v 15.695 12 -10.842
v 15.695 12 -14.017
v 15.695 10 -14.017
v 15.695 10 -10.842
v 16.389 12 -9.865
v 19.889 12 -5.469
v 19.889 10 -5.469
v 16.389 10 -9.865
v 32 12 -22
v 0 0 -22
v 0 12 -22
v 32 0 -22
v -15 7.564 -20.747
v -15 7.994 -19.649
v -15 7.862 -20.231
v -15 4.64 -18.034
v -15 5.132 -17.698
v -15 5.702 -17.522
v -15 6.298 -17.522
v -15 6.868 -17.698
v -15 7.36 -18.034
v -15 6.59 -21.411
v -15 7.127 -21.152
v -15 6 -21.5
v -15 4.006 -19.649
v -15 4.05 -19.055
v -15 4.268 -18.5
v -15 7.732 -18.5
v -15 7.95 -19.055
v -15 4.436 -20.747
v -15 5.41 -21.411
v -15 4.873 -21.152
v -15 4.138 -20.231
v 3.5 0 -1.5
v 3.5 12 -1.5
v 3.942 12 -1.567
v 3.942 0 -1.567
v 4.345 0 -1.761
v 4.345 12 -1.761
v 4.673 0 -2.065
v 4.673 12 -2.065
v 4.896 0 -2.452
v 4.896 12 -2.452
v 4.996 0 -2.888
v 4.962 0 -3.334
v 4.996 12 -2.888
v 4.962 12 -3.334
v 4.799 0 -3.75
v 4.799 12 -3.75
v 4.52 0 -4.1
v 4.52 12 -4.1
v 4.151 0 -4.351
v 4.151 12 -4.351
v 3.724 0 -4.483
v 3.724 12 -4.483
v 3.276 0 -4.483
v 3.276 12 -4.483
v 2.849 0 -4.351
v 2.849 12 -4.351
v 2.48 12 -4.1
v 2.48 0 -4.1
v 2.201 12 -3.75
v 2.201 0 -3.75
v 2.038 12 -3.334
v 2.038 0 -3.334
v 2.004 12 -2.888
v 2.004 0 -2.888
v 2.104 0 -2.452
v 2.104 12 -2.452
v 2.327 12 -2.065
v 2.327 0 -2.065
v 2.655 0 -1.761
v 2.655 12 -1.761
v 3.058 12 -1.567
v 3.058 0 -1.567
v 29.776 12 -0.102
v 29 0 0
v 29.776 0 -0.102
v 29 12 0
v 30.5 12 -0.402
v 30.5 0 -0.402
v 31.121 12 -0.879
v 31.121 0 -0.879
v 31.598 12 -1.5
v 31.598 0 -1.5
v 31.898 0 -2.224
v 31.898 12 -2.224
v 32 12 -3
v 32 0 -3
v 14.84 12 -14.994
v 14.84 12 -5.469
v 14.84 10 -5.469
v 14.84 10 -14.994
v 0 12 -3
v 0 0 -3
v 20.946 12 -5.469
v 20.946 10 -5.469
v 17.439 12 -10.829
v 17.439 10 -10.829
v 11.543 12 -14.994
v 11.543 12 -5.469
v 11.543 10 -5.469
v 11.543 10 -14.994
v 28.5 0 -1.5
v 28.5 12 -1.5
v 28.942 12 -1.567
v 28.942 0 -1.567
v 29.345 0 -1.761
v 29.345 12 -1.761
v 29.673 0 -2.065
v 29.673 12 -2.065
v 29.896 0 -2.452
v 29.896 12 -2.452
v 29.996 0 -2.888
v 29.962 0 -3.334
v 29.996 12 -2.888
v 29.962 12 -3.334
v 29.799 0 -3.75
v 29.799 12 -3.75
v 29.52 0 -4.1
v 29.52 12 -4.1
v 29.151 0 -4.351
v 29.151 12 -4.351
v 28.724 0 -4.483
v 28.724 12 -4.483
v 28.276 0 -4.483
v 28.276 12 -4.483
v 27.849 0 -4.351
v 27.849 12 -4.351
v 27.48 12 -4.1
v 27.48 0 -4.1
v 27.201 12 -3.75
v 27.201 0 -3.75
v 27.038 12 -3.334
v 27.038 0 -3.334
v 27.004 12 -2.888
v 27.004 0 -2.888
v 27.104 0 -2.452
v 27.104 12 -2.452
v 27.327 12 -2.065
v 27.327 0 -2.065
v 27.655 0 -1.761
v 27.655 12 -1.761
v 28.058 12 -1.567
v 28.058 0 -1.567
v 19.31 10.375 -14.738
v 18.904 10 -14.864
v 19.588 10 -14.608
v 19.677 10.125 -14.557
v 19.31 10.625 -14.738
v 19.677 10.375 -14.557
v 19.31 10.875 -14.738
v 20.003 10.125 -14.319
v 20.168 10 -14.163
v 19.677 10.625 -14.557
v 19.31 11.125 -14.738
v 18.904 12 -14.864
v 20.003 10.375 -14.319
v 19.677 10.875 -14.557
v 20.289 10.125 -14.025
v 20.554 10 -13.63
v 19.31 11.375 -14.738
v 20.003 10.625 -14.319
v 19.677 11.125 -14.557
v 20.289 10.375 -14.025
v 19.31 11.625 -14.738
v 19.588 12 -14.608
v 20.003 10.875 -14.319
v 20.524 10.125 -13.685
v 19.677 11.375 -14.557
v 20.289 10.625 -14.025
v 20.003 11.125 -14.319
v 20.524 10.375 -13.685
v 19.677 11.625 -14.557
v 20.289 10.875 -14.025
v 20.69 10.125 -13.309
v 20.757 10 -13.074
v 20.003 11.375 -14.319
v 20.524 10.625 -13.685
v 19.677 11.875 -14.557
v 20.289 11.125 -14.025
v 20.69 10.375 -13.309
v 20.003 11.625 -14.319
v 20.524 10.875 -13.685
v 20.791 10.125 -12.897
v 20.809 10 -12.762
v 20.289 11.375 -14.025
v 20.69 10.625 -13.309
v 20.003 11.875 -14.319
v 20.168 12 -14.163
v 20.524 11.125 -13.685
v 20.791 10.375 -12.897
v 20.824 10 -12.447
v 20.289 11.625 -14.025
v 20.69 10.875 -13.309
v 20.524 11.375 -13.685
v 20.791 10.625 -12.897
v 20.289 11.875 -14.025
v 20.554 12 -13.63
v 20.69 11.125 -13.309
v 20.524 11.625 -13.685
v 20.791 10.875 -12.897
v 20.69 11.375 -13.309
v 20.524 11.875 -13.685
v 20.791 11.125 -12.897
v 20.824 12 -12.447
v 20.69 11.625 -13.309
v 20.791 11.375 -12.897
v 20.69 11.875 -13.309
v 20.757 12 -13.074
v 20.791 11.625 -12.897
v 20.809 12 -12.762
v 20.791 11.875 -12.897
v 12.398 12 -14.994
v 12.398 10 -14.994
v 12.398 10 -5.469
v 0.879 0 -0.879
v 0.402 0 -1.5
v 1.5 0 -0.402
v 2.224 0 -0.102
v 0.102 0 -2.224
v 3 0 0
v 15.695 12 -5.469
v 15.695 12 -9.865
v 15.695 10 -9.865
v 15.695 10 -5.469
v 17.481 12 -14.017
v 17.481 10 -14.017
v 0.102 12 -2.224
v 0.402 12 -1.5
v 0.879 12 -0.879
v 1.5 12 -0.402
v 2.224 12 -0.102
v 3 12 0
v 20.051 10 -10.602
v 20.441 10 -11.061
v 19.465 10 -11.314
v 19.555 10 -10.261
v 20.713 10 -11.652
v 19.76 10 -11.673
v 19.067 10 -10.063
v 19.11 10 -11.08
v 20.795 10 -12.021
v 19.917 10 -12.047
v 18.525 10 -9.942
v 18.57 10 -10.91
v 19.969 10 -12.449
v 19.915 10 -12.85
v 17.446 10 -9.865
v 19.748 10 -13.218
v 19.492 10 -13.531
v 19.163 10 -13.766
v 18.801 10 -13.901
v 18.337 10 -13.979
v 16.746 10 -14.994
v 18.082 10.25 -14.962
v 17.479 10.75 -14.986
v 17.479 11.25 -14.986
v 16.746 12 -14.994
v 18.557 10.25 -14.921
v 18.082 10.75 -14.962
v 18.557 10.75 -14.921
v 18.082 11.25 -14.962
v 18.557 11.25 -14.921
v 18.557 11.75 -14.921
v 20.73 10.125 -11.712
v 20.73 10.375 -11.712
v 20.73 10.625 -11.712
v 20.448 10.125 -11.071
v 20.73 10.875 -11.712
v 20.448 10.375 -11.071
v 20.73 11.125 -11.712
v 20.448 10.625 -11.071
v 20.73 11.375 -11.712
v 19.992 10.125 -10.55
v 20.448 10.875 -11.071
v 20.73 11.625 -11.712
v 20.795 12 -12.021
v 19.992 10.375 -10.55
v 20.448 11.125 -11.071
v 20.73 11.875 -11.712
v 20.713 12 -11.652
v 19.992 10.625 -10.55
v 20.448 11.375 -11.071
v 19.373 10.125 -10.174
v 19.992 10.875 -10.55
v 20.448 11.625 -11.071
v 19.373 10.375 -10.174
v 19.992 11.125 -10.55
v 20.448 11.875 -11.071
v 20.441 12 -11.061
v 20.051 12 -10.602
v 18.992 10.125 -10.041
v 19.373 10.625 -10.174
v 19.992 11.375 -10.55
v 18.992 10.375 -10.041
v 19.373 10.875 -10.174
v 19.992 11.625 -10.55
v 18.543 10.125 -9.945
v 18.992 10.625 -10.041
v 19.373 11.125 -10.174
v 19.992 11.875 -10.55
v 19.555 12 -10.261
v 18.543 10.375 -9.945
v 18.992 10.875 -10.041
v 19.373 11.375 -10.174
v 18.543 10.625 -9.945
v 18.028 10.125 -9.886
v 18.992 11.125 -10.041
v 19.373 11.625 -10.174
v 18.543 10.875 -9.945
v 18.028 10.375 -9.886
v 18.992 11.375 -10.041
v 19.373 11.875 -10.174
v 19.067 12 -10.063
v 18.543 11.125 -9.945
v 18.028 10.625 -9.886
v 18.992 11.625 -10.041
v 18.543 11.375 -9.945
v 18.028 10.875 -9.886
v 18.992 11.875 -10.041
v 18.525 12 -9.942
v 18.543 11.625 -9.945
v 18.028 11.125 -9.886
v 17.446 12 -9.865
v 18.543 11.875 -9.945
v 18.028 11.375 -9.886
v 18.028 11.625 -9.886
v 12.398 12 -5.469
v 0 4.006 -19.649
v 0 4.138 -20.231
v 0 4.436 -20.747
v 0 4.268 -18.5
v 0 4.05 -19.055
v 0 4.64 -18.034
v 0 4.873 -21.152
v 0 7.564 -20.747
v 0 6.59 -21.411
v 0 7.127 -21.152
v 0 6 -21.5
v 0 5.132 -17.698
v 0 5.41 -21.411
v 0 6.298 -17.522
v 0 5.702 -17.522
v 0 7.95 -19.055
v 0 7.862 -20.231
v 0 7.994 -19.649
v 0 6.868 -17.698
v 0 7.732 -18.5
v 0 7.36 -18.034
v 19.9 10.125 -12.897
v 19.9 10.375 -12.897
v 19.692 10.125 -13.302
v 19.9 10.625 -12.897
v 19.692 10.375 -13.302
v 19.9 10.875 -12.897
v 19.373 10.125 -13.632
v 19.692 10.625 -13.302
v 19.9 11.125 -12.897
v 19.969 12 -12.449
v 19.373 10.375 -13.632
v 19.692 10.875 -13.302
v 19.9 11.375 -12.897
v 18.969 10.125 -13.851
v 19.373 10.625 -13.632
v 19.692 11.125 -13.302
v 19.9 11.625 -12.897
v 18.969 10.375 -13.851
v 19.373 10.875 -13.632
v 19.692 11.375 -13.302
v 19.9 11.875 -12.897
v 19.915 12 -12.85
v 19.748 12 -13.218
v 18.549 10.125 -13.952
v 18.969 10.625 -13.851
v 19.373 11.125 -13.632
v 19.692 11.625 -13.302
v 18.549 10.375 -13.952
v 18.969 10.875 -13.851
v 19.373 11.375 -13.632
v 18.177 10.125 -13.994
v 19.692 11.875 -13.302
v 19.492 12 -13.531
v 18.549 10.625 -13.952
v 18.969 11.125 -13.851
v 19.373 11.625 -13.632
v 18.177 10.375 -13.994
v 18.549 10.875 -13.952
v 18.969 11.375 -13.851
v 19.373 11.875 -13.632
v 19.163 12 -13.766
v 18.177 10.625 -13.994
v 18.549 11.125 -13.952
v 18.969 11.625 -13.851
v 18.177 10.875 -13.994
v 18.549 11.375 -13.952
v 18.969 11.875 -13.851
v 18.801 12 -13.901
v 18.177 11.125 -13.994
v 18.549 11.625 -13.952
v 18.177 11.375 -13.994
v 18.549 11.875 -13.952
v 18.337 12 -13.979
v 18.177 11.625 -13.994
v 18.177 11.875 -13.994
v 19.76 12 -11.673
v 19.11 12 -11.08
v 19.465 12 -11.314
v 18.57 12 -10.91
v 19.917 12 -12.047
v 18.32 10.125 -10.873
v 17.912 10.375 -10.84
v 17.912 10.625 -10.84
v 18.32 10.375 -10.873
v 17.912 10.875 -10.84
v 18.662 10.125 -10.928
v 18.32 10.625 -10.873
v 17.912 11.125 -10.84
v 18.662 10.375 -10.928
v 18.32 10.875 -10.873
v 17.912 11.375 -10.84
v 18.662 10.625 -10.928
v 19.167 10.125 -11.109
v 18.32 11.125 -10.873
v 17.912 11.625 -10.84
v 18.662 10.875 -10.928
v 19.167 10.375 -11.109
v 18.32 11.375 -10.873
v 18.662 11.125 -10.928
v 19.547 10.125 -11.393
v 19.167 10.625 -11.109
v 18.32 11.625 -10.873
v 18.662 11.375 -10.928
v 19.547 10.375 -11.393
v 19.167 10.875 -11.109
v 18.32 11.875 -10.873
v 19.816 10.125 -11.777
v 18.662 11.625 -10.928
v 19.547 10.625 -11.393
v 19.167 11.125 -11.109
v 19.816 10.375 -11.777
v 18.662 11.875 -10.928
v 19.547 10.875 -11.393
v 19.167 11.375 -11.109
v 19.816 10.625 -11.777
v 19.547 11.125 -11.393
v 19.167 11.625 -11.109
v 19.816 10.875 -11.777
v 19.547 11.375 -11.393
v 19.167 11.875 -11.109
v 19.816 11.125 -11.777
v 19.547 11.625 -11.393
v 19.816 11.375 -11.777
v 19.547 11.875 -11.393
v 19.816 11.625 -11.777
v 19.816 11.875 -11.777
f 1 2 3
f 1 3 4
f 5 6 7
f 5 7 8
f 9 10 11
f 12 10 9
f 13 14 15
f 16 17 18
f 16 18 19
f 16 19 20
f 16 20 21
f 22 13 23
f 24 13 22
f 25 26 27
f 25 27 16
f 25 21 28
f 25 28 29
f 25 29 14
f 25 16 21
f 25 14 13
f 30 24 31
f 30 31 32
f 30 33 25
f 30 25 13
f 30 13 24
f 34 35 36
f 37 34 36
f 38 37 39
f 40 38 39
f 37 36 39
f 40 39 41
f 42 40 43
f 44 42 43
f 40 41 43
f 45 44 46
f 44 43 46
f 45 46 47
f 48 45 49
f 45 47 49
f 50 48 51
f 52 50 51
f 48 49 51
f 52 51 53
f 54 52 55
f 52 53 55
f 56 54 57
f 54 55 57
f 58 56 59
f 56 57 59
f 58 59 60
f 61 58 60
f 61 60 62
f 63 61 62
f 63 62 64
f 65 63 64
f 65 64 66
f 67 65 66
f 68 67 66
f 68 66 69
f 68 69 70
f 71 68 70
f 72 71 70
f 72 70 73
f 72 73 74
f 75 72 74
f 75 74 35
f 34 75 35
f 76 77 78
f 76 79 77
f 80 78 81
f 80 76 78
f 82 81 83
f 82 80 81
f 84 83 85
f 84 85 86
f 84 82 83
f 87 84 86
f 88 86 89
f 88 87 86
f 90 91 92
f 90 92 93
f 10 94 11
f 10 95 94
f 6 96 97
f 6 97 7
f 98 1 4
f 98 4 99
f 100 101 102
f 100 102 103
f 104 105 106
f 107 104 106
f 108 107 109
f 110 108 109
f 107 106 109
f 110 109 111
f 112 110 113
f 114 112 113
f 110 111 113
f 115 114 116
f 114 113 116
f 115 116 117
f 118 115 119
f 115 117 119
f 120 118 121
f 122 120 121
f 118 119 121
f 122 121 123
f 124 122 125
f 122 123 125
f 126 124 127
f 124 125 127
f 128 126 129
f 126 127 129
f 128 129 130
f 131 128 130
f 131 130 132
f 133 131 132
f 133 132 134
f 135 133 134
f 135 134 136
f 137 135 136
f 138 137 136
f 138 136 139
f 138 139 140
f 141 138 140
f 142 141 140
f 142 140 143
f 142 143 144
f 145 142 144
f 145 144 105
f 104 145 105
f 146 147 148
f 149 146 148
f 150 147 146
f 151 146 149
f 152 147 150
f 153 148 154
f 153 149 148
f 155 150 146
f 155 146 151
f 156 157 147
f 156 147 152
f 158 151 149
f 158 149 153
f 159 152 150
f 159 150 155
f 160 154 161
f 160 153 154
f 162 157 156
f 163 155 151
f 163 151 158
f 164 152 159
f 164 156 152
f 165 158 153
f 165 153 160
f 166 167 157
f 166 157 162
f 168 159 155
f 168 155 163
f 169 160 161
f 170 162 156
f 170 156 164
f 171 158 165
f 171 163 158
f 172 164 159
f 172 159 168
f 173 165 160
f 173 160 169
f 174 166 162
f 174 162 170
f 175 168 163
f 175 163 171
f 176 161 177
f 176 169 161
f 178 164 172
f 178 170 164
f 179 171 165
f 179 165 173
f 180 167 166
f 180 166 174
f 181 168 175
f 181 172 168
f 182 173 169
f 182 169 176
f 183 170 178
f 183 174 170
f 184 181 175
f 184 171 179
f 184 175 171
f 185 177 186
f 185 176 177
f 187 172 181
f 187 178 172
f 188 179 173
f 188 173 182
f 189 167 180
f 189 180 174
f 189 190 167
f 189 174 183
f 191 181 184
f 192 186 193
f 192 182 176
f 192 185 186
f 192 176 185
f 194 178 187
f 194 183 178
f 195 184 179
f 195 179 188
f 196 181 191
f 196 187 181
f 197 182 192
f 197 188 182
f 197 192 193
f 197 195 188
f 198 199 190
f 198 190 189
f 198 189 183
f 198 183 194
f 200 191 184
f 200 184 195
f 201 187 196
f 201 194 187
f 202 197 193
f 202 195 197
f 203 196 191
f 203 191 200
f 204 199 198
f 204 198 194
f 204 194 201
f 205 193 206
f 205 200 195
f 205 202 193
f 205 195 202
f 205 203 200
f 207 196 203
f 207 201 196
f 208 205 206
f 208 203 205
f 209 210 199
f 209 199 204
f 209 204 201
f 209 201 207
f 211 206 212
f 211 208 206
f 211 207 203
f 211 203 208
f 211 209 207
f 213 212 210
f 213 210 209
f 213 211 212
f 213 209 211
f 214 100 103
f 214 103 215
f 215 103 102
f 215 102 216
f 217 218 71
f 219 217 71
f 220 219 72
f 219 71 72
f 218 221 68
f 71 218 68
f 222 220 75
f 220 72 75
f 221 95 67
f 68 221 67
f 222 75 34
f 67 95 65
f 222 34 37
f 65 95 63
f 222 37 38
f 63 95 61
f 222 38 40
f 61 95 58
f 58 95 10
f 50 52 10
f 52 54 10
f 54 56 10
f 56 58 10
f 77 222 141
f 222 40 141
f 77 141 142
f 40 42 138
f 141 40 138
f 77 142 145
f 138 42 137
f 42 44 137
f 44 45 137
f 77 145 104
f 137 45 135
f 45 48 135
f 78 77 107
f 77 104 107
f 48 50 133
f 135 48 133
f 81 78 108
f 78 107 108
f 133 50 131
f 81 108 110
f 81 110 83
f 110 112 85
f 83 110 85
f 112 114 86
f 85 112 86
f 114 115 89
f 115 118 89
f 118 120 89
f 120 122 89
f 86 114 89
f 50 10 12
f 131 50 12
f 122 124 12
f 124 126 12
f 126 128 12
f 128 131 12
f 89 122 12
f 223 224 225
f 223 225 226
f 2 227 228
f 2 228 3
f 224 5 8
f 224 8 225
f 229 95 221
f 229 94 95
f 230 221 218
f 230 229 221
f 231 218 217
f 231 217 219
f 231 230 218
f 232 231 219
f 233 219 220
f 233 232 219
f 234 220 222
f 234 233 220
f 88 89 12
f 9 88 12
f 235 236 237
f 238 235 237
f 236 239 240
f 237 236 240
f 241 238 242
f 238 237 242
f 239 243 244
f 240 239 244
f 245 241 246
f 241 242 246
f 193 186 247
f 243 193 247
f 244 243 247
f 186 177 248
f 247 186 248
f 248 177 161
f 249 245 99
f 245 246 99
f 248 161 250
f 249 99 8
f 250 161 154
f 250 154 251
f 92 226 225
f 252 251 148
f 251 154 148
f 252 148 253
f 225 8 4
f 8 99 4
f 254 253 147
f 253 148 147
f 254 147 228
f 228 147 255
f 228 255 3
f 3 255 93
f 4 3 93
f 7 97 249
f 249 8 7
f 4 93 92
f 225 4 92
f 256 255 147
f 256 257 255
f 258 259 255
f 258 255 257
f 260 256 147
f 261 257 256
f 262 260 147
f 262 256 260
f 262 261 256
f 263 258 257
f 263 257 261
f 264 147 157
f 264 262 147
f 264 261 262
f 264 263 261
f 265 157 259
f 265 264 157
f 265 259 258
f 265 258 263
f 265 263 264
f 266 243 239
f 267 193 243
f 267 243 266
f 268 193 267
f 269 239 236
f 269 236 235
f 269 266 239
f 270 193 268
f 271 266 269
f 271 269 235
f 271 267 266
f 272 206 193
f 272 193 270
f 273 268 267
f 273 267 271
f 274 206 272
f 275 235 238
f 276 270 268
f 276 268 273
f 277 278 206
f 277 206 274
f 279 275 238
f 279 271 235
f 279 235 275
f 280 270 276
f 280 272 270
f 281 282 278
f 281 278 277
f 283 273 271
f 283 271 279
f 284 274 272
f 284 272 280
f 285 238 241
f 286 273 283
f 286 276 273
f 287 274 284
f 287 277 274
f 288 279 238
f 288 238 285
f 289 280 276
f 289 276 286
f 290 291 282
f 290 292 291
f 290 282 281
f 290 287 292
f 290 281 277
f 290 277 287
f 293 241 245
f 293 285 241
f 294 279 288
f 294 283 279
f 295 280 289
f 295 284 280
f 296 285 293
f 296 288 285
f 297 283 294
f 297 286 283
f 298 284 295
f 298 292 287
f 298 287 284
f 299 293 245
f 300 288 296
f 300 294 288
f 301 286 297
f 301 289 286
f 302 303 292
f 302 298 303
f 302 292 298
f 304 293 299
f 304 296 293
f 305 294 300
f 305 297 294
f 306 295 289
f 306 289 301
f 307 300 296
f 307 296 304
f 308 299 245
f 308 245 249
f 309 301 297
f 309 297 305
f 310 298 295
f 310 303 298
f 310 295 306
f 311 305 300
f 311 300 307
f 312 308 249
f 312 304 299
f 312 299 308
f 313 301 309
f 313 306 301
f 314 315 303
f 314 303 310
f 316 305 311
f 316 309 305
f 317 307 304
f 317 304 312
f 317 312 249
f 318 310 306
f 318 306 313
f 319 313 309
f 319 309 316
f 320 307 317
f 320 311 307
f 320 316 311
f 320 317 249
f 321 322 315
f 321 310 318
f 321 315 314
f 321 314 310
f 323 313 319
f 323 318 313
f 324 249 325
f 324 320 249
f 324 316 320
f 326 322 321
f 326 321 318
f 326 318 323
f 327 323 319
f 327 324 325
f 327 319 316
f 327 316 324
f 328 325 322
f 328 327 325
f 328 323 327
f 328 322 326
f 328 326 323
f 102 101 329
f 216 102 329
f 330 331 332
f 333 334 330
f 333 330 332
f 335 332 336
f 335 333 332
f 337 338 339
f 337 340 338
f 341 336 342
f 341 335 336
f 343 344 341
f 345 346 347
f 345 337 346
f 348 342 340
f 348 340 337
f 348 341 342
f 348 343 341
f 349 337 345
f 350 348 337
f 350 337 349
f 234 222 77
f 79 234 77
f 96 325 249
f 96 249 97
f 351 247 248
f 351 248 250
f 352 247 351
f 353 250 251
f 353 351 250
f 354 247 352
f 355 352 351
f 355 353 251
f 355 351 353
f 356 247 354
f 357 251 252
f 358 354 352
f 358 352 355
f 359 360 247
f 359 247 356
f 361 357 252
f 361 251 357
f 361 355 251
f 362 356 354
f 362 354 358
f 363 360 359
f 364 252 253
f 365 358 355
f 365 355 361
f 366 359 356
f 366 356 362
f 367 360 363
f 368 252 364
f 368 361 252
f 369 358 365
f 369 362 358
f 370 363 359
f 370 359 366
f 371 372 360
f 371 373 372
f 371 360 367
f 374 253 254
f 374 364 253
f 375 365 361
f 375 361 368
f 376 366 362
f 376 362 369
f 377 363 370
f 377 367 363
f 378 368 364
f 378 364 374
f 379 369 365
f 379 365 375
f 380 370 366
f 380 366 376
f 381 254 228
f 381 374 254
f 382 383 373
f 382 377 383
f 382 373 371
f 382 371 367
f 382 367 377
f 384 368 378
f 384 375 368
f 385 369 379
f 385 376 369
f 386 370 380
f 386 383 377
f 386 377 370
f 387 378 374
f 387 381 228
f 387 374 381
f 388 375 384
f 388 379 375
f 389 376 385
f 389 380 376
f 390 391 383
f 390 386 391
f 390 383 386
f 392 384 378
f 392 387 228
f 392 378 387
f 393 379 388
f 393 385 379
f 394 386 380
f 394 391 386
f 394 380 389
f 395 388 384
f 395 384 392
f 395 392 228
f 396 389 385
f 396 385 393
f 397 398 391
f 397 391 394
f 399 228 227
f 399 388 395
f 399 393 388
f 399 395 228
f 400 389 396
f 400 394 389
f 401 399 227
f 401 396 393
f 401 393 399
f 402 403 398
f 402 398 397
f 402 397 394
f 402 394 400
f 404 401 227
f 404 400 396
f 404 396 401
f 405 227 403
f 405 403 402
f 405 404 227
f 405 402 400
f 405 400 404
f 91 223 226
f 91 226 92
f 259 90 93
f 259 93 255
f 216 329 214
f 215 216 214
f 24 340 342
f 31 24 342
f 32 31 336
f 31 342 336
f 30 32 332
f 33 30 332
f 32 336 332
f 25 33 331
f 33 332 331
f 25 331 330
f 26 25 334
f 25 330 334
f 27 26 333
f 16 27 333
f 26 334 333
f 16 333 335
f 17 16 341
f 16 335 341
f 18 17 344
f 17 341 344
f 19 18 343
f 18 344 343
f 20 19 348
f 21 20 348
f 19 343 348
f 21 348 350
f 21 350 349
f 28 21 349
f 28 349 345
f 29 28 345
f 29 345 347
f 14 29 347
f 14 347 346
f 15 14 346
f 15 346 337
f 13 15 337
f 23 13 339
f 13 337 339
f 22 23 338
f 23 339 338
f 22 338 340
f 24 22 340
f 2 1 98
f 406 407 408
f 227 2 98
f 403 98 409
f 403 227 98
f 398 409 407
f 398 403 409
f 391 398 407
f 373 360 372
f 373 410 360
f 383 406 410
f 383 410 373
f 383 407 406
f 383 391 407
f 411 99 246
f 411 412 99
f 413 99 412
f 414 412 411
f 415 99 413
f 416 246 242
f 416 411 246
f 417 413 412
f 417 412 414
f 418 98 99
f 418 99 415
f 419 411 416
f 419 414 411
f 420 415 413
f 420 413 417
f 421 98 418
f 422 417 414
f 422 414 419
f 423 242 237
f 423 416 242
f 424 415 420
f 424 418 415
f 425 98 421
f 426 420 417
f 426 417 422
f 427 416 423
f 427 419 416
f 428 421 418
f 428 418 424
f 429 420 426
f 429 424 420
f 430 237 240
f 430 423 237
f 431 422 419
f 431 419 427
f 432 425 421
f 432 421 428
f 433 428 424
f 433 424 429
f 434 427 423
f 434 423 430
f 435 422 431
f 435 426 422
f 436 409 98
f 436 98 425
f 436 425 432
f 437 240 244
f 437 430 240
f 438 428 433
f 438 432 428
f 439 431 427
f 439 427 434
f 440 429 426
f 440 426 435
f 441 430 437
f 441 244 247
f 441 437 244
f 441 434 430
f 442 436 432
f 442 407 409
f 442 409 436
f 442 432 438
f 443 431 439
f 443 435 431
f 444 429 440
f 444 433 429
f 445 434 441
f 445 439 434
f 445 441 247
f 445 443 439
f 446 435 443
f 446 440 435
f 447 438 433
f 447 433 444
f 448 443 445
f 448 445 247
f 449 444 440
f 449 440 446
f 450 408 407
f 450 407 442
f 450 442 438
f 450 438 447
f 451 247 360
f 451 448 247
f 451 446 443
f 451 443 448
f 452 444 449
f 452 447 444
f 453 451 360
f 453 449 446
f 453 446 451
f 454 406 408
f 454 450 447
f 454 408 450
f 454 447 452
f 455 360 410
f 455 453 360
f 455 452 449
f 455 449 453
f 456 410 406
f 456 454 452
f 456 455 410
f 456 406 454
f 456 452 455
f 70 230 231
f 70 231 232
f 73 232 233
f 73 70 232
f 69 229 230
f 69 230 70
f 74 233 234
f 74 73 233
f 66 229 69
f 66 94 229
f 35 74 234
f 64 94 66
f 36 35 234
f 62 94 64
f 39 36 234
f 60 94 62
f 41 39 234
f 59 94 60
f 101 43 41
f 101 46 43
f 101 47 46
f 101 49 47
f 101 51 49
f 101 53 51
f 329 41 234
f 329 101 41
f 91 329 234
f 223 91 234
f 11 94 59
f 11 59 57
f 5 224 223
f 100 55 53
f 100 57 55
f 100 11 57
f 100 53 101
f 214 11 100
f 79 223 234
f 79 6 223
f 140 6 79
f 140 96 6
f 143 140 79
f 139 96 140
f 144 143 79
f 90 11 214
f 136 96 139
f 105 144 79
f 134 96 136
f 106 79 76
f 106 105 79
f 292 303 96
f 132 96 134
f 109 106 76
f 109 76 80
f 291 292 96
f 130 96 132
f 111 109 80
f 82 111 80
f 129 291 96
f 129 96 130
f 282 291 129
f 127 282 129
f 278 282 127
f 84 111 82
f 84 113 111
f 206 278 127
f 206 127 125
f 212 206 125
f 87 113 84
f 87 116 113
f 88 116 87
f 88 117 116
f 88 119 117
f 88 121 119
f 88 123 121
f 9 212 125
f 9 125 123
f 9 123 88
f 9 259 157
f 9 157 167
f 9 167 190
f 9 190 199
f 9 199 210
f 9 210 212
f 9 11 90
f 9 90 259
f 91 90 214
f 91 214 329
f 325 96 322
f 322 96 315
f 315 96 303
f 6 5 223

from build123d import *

# Parameters (mm, degrees)
SKETCH1_W           = 32
SKETCH1_H           = 22
BOSS_EXTRUDE1_DEPTH = 12
SKETCH2_R           = 2
BOSS_EXTRUDE2_DEPTH = 15
SKETCH3_R           = 1.5
CUT_EXTRUDE1_DEPTH  = 41.644802866
SKETCH4_W           = 0.854807692
SKETCH4_H           = 9.525
CUT_EXTRUDE2_DEPTH  = 2
FILLET1_R           = 3


with BuildPart() as part:
    # Sketch1 → Boss-Extrude1 (new body)
    with BuildSketch(Plane(origin=(0, 0, 0), x_dir=(1, 0, 0), z_dir=(0, 1, 0))):
        with Locations((16, 11)):
            Rectangle(SKETCH1_W, SKETCH1_H)
    extrude(amount=BOSS_EXTRUDE1_DEPTH)

    # Sketch2 → Boss-Extrude2 (add)
    with BuildSketch(Plane.ZY):
        with Locations((-19.5, 6)):
            Circle(SKETCH2_R)
    extrude(amount=BOSS_EXTRUDE2_DEPTH)

    # Sketch3 → Cut-Extrude1 (cut, through all)
    with BuildSketch(Plane(origin=(0, 12, 0), x_dir=(1, 0, 0), z_dir=(0, 1, 0))):
        with Locations((3.5, 3)):
            Circle(SKETCH3_R)
        with Locations((28.5, 3)):
            Circle(SKETCH3_R)
    extrude(amount=-CUT_EXTRUDE1_DEPTH, mode=Mode.SUBTRACT)

    # Sketch4 → Cut-Extrude2 (cut)
    # profile 1 of 2: a face of its own
    with BuildSketch(Plane(origin=(0, 12, 0), x_dir=(1, 0, 0), z_dir=(0, 1, 0))):
        with Locations((11.970192308, 10.231461459)):
            Rectangle(SKETCH4_W, SKETCH4_H)
    # profile 2 of 2: a face of its own
    with BuildSketch(Plane(origin=(0, 12, 0), x_dir=(1, 0, 0), z_dir=(0, 1, 0))):
        with BuildLine():
            Line((14.839903846, 14.993961459), (16.746048678, 14.993961459))
            add(Edge.make_bspline(
                [(16.746048678, 14.993961459), (16.87325132, 14.993538043), (17.117494485, 14.992725037), (17.467397456, 14.988191782), (17.785334056, 14.975198714), (18.071138047, 14.964017498), (18.324804187, 14.943628715), (18.547110314, 14.924141525), (18.737032548, 14.898631777), (18.852001615, 14.87494059), (18.90405649, 14.864213863)],
                knots=[0, 0, 0, 0, 1.410062039, 2.707475311, 3.878576406, 4.937260626, 5.877586885, 6.699081471, 7.410979367, 8, 8, 8, 8], degree=3))
            add(Edge.make_bspline(
                [(18.90405649, 14.864213863), (18.973743089, 14.846996023), (19.111629682, 14.812927646), (19.310158076, 14.740919733), (19.499336343, 14.657590611), (19.678378651, 14.559717915), (19.846388197, 14.446575122), (20.005097314, 14.320115446), (20.155226182, 14.181030836), (20.290703333, 14.025814589), (20.418444609, 13.862973802), (20.526182228, 13.686887149), (20.619055005, 13.502751135), (20.692997627, 13.308693091), (20.752536969, 13.106594983), (20.794518377, 12.894626186), (20.819694824, 12.67375239), (20.822258016, 12.523099795), (20.823557692, 12.446710858)],
                knots=[0, 0, 0, 0, 1.027469482, 2.033020251, 3.019912614, 3.986113645, 4.951240523, 5.91722682, 6.890402269, 7.87763091, 8.8651537, 9.85103654, 10.82876324, 11.815024772, 12.821070561, 13.842952187, 14.906261191, 16, 16, 16, 16], degree=3))
            add(Edge.make_bspline(
                [(20.823557692, 12.446710858), (20.819559919, 12.319796752), (20.811759227, 12.07215446), (20.739028767, 11.712760204), (20.619894095, 11.377509283), (20.455728573, 11.066823819), (20.246669857, 10.786759848), (19.995414533, 10.54076868), (19.701822433, 10.334920061), (19.428511223, 10.1921735), (19.187081865, 10.100752798), (18.988326921, 10.036428136), (18.771518932, 9.986729502), (18.538735186, 9.942206572), (18.289006952, 9.908592318), (18.022932774, 9.883972657), (17.740322889, 9.868585568), (17.546178708, 9.866294111), (17.446304087, 9.865115305)],
                knots=[0, 0, 0, 0, 1.260483769, 2.459530307, 3.627416485, 4.787058657, 5.939039949, 7.08810263, 8.267026773, 9.491475466, 10.141966685, 10.831826277, 11.566392101, 12.351337768, 13.187381173, 14.07005841, 15.007169909, 16, 16, 16, 16], degree=3))
            Line((17.446304087, 9.865115305), (20.945673077, 5.468961459))
            Line((20.945673077, 5.468961459), (19.888611779, 5.468961459))
            Line((19.888611779, 5.468961459), (16.389242788, 9.865115305))
            Line((16.389242788, 9.865115305), (15.694711538, 9.865115305))
            Line((15.694711538, 9.865115305), (15.694711538, 5.468961459))
            Line((15.694711538, 5.468961459), (14.839903846, 5.468961459))
            Line((14.839903846, 5.468961459), (14.839903846, 14.993961459))
        make_face()
        with BuildLine():
            Line((15.694711538, 14.017038382), (15.694711538, 10.842038382))
            Line((15.694711538, 10.842038382), (17.438671875, 10.828682012))
            add(Edge.make_bspline(
                [(17.438671875, 10.828682012), (17.520097124, 10.82864599), (17.677922447, 10.828576167), (17.906252113, 10.839444944), (18.118850417, 10.85180926), (18.314904179, 10.870721408), (18.49450098, 10.895094717), (18.657551055, 10.925582839), (18.80432056, 10.961103095), (18.97549444, 11.016080377), (19.166638143, 11.103182469), (19.374368759, 11.229907148), (19.551267978, 11.389298822), (19.700723017, 11.571562299), (19.820818113, 11.77195809), (19.905487347, 11.988084066), (19.959214993, 12.214484058), (19.965551963, 12.370090195), (19.96875, 12.448618911)],
                knots=[0, 0, 0, 0, 1.146690395, 2.22261258, 3.21895312, 4.145990853, 4.996080663, 5.770904154, 6.481378293, 7.121626537, 8.300444488, 9.431385265, 10.535395872, 11.636531494, 12.74115979, 13.810798291, 14.895190096, 16, 16, 16, 16], degree=3))
            add(Edge.make_bspline(
                [(19.96875, 12.448618911), (19.965478513, 12.525217801), (19.95899562, 12.677008851), (19.906067186, 12.899229578), (19.816561084, 13.108961778), (19.695941279, 13.305352269), (19.548986436, 13.48362145), (19.376671532, 13.636149774), (19.183708108, 13.762014389), (19.003355775, 13.842444524), (18.842154097, 13.891756411), (18.702191951, 13.926457792), (18.544045715, 13.954337382), (18.366947502, 13.976675034), (18.17165335, 13.995874561), (17.957175792, 14.008806187), (17.72493784, 14.016463917), (17.563973692, 14.016842438), (17.480649038, 14.017038382)],
                knots=[0, 0, 0, 0, 1.101028733, 2.181837193, 3.264309656, 4.369019818, 5.486613113, 6.575447106, 7.666700264, 8.788928104, 9.402425223, 10.0903467, 10.862060571, 11.710948788, 12.657782767, 13.684531032, 14.801375019, 16, 16, 16, 16], degree=3))
            Line((17.480649038, 14.017038382), (15.694711538, 14.017038382))
        make_face(mode=Mode.SUBTRACT)
    extrude(amount=-CUT_EXTRUDE2_DEPTH, mode=Mode.SUBTRACT)


with BuildPart() as body_2:
    # Split1: the piece on the far side of the plane
    add(part.part)
    split(bisect_by=Plane(origin=(0, 12, 0), x_dir=(0, 0, 1), z_dir=(1, 0, 0)), keep=Keep.BOTTOM)


with BuildPart() as part_1:
    add(part.part)

    # Split1
    split(bisect_by=Plane(origin=(0, 12, 0), x_dir=(0, 0, 1), z_dir=(1, 0, 0)), keep=Keep.TOP)

    # Fillet1
    fillet1_edges = [part_1.edges().sort_by_distance(p)[0] for p in [
        (32, 6, 0),
        (0, 6, 0),
    ]]
    fillet(fillet1_edges, radius=FILLET1_R)


solid = Compound([body_2.part, part_1.part])
